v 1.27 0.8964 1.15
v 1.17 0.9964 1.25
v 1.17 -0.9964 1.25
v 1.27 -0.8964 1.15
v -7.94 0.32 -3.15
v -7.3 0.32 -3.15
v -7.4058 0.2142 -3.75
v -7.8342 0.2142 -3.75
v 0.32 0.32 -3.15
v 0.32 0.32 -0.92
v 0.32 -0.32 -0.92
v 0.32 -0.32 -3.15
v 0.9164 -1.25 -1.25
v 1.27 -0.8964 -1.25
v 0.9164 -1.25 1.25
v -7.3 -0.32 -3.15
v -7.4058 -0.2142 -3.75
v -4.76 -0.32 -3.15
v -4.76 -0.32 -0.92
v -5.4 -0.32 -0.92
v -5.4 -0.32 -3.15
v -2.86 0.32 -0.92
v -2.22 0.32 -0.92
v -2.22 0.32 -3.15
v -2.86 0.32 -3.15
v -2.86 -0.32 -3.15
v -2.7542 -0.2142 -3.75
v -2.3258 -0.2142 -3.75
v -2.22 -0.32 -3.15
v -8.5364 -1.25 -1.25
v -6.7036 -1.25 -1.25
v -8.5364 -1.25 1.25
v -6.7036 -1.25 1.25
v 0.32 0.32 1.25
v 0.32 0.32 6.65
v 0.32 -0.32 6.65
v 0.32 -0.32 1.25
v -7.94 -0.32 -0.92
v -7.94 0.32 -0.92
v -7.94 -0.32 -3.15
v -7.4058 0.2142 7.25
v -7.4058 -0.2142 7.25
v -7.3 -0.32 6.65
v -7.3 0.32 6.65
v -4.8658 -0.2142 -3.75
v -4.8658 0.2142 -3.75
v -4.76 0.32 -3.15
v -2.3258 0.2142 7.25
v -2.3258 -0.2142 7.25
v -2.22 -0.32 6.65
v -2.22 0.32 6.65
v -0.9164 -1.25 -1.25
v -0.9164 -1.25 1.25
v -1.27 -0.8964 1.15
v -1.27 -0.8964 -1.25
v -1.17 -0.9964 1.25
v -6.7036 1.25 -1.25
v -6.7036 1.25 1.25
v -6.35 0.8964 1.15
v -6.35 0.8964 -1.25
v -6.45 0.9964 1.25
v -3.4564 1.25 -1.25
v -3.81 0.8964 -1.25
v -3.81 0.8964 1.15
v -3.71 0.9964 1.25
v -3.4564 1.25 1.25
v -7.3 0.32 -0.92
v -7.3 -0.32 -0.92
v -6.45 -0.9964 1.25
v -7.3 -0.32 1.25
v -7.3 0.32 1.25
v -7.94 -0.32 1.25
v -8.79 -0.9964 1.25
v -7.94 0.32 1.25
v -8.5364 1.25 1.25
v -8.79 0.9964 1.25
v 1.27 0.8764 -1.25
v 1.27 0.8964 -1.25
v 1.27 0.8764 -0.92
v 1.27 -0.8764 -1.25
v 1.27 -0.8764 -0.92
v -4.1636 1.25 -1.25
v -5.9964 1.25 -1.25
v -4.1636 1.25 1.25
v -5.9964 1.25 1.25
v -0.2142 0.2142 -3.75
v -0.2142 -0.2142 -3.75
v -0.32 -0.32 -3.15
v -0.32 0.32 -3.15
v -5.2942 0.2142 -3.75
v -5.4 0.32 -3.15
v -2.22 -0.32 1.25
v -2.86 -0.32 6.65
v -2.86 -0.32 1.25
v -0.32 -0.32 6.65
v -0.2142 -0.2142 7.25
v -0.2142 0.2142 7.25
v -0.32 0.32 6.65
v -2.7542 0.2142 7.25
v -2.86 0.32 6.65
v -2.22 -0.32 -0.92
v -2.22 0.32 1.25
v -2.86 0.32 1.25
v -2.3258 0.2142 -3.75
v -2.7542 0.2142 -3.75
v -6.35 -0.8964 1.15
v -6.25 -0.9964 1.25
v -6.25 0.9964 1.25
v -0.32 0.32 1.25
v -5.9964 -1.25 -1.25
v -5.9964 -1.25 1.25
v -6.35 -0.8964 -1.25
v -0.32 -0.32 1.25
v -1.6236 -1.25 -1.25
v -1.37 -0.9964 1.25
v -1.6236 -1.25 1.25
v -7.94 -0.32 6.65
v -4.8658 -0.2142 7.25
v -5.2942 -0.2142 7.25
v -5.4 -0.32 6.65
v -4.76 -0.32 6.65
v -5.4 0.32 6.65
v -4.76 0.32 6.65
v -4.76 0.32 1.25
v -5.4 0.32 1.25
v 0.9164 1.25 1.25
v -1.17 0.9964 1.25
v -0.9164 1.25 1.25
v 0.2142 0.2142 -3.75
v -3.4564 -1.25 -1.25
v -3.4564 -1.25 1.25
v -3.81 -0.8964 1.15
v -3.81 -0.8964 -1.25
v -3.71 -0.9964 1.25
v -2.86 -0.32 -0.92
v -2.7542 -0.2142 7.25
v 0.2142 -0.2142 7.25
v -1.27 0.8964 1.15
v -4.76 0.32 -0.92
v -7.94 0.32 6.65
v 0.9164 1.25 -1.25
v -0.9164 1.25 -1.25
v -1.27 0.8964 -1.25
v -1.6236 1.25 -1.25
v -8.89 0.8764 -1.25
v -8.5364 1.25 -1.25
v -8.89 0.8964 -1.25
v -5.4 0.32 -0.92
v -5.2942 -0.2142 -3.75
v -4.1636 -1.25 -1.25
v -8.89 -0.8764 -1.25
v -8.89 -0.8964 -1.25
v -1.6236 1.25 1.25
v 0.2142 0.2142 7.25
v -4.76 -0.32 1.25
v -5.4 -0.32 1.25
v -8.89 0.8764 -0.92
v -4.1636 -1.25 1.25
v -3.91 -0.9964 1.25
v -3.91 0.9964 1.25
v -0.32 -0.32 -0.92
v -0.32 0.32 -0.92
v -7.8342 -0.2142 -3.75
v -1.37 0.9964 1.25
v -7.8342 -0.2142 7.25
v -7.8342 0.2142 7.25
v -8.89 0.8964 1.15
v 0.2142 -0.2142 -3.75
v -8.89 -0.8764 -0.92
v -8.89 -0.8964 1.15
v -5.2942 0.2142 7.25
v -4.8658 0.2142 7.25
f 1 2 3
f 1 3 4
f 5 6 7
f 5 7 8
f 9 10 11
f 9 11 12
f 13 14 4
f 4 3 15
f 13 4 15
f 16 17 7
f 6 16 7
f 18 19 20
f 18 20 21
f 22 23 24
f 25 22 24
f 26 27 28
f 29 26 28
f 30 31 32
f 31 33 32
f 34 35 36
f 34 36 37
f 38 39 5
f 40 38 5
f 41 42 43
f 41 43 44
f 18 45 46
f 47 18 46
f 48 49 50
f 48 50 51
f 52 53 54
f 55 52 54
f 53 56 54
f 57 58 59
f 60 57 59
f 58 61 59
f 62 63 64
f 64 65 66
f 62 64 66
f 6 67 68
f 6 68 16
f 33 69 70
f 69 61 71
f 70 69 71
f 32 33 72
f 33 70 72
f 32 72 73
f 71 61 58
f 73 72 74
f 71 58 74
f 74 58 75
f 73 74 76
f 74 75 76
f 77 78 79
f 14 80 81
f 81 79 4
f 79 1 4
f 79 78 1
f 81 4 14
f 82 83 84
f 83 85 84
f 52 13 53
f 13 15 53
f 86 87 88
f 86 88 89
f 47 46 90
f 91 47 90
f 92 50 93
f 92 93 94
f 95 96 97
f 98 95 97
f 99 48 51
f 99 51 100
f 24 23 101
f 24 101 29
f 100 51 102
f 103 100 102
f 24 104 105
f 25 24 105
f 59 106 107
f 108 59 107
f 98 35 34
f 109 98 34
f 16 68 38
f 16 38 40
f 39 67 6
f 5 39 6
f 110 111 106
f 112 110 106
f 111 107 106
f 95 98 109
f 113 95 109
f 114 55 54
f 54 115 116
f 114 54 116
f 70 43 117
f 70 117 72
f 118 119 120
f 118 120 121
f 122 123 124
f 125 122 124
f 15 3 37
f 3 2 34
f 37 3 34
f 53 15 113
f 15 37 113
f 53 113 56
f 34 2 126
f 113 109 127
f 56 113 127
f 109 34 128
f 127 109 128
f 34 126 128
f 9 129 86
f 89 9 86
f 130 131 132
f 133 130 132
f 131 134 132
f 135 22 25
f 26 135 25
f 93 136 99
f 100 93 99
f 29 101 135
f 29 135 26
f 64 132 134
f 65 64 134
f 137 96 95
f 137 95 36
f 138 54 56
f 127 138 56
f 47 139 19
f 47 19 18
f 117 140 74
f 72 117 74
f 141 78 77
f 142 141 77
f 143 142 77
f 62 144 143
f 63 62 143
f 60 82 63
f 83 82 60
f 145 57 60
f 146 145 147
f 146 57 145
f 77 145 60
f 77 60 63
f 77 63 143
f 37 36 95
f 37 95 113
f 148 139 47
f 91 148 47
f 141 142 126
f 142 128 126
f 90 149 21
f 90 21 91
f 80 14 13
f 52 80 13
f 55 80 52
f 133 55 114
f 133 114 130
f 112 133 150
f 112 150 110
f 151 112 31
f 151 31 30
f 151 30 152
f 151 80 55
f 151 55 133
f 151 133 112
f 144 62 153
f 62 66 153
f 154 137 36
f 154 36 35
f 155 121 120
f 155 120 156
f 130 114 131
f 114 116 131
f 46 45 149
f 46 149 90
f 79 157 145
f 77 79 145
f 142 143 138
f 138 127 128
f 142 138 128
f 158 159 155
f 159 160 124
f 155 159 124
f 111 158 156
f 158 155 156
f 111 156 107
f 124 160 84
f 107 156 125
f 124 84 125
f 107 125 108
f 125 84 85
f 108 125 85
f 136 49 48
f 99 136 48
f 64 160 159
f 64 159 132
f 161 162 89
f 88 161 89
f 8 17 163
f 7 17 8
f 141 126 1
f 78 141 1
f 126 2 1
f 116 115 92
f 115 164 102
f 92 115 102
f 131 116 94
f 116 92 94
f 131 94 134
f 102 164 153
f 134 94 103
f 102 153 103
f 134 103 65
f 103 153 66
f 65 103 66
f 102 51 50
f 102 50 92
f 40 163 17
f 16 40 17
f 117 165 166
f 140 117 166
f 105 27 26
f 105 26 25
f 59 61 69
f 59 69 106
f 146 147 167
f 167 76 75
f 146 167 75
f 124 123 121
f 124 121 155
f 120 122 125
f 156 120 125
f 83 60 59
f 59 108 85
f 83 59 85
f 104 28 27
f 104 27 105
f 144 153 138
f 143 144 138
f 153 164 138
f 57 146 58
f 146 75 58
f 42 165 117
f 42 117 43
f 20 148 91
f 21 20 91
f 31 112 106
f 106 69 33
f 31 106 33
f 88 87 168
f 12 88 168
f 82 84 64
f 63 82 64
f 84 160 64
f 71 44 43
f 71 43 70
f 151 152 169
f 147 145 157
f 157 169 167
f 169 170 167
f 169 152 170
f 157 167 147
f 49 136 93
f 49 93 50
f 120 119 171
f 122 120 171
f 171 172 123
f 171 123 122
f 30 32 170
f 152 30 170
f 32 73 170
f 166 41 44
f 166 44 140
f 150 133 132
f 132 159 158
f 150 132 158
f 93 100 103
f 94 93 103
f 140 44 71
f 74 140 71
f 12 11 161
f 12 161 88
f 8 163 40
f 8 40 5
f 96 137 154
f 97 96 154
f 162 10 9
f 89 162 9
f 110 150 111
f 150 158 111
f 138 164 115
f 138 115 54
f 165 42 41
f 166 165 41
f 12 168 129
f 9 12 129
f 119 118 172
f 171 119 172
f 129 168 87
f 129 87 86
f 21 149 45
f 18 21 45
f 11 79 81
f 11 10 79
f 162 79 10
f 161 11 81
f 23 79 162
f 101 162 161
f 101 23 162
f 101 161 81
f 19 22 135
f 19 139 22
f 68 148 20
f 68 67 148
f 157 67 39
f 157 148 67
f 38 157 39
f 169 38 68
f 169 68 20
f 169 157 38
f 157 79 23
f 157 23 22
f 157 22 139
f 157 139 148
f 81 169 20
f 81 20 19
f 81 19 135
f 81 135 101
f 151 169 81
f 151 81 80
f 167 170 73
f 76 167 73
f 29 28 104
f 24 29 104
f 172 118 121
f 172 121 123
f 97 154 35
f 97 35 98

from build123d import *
from OCP.BRepFilletAPI import BRepFilletAPI_MakeChamfer

# Parameters (mm, degrees)
EXTRUDE1_DEPTH          = 1.25
CUT_EXTRUDE3_DEPTH      = 3.176671771
LPATTERN4_COUNT         = 4
LPATTERN4_PITCH         = 2.54
CUT_EXTRUDE1_DEPTH      = 10.064055384
CUT_EXTRUDE1_DEPTH_BACK = 10.064055384
SKETCH2_W               = 1.752893218
SKETCH2_H               = 0.33
SKETCH3_W               = 11
SKETCH3_H               = 0.64
EXTRUDE_THIN1_DEPTH     = 0.32
LPATTERN5_COUNT         = 5
LPATTERN5_PITCH         = 2.54
CHAMFER2_SIZE           = 0.6
CHAMFER2_SIZE2          = 0.105796188


with BuildPart() as part:
    # Sketch1 → Extrude1 (new, symmetric)
    with BuildSketch(Plane.XY):
        Polygon((-1.27, 0.896446609), (-0.916446609, 1.25), (0.916446609, 1.25), (1.27, 0.896446609), (1.27, -0.896446609), (0.916446609, -1.25), (-0.916446609, -1.25), (-1.27, -0.896446609), align=None)
    extrude1 = extrude(amount=EXTRUDE1_DEPTH, both=True)

    # Sketch4 → Cut-Extrude3 (cut, symmetric)
    with BuildSketch(Plane(origin=(0, 0, 0), x_dir=(1, 0, 0), z_dir=(0, 1, 0))):
        Polygon((-1.27, -1.15), (-1.17, -1.25), (-1.27, -1.25), align=None)
        Polygon((1.17, -1.25), (1.27, -1.15), (1.27, -1.25), align=None)
    cut_extrude3 = extrude(amount=CUT_EXTRUDE3_DEPTH, both=True, mode=Mode.SUBTRACT)

    # LPattern4: Extrude1, Cut-Extrude3 ×4
    with Locations(*[(-i * LPATTERN4_PITCH, 0, 0) for i in range(1, LPATTERN4_COUNT)]):
        add(extrude1)
        add(cut_extrude3, mode=Mode.SUBTRACT)

    # Sketch2 → Cut-Extrude1 (cut, two sides: drawn at the far end of the back side and taken through both)
    with BuildSketch(Plane(origin=(0, 0, 0), x_dir=(0, -1, 0), z_dir=(1, 0, 0)).offset(-CUT_EXTRUDE1_DEPTH_BACK)):
        with Locations((0, 1.085)):
            Rectangle(SKETCH2_W, SKETCH2_H)
    extrude(amount=CUT_EXTRUDE1_DEPTH + CUT_EXTRUDE1_DEPTH_BACK, mode=Mode.SUBTRACT)

    # Sketch3 → Extrude-Thin1 (add, symmetric)
    with BuildSketch(Plane(origin=(0, 0, 0), x_dir=(0, 0, -1), z_dir=(1, 0, 0))):
        with Locations((-1.75, 0)):
            Rectangle(SKETCH3_W, SKETCH3_H)
    extrude_thin1 = extrude(amount=EXTRUDE_THIN1_DEPTH, both=True)

    # LPattern5: Extrude-Thin1 ×5, 1 skipped
    with Locations(*[(-i * LPATTERN5_PITCH, 0, 0) for i in range(1, LPATTERN5_COUNT) if i not in (4,)]):
        add(extrude_thin1)

    # Chamfer2: one chamfer whose edges measure the first distance from different faces: ONE call of the kernel's chamfer builder (chamfer() names one face for all edges)
    chamfer2_edges_1 = [part.edges().sort_by_distance(p)[0] for p in [
        (0, -0.32, 7.25),
    ]]
    chamfer2_side_1 = [part.faces().sort_by_distance(p)[0] for p in [
        (0, -0.32, 4.25),
    ]]
    chamfer2_edges_2 = [part.edges().sort_by_distance(p)[0] for p in [
        (0, 0.32, -3.75),
    ]]
    chamfer2_side_2 = [part.faces().sort_by_distance(p)[0] for p in [
        (0, 0.32, -2.335),
    ]]
    chamfer2_edges_3 = [part.edges().sort_by_distance(p)[0] for p in [
        (-0.32, 0, 7.25),
    ]]
    chamfer2_side_3 = [part.faces().sort_by_distance(p)[0] for p in [
        (-0.32, 0, 4.25),
    ]]
    chamfer2_edges_4 = [part.edges().sort_by_distance(p)[0] for p in [
        (-0.32, 0, -3.75),
    ]]
    chamfer2_side_4 = [part.faces().sort_by_distance(p)[0] for p in [
        (-0.32, 0, -2.335),
    ]]
    chamfer2_edges_5 = [part.edges().sort_by_distance(p)[0] for p in [
        (0, -0.32, -3.75),
    ]]
    chamfer2_side_5 = [part.faces().sort_by_distance(p)[0] for p in [
        (0, -0.32, -2.335),
    ]]
    chamfer2_edges_6 = [part.edges().sort_by_distance(p)[0] for p in [
        (0.32, 0, -3.75),
    ]]
    chamfer2_side_6 = [part.faces().sort_by_distance(p)[0] for p in [
        (0.32, 0, -2.335),
    ]]
    chamfer2_edges_7 = [part.edges().sort_by_distance(p)[0] for p in [
        (0, 0.32, 7.25),
    ]]
    chamfer2_side_7 = [part.faces().sort_by_distance(p)[0] for p in [
        (0, 0.32, 4.25),
    ]]
    chamfer2_edges_8 = [part.edges().sort_by_distance(p)[0] for p in [
        (0.32, 0, 7.25),
    ]]
    chamfer2_side_8 = [part.faces().sort_by_distance(p)[0] for p in [
        (0.32, 0, 4.25),
    ]]
    chamfer2_edges_9 = [part.edges().sort_by_distance(p)[0] for p in [
        (-2.54, -0.32, 7.25),
    ]]
    chamfer2_side_9 = [part.faces().sort_by_distance(p)[0] for p in [
        (-2.54, -0.32, 4.25),
    ]]
    chamfer2_edges_10 = [part.edges().sort_by_distance(p)[0] for p in [
        (-2.54, 0.32, -3.75),
    ]]
    chamfer2_side_10 = [part.faces().sort_by_distance(p)[0] for p in [
        (-2.54, 0.32, -2.335),
    ]]
    chamfer2_edges_11 = [part.edges().sort_by_distance(p)[0] for p in [
        (-2.86, 0, -3.75),
    ]]
    chamfer2_side_11 = [part.faces().sort_by_distance(p)[0] for p in [
        (-2.86, 0, -2.335),
    ]]
    chamfer2_edges_12 = [part.edges().sort_by_distance(p)[0] for p in [
        (-2.86, 0, 7.25),
    ]]
    chamfer2_side_12 = [part.faces().sort_by_distance(p)[0] for p in [
        (-2.86, 0, 4.25),
    ]]
    chamfer2_edges_13 = [part.edges().sort_by_distance(p)[0] for p in [
        (-2.54, -0.32, -3.75),
    ]]
    chamfer2_side_13 = [part.faces().sort_by_distance(p)[0] for p in [
        (-2.54, -0.32, -2.335),
    ]]
    chamfer2_edges_14 = [part.edges().sort_by_distance(p)[0] for p in [
        (-2.22, 0, -3.75),
    ]]
    chamfer2_side_14 = [part.faces().sort_by_distance(p)[0] for p in [
        (-2.22, 0, -2.335),
    ]]
    chamfer2_edges_15 = [part.edges().sort_by_distance(p)[0] for p in [
        (-2.54, 0.32, 7.25),
    ]]
    chamfer2_side_15 = [part.faces().sort_by_distance(p)[0] for p in [
        (-2.54, 0.32, 4.25),
    ]]
    chamfer2_edges_16 = [part.edges().sort_by_distance(p)[0] for p in [
        (-2.22, 0, 7.25),
    ]]
    chamfer2_side_16 = [part.faces().sort_by_distance(p)[0] for p in [
        (-2.22, 0, 4.25),
    ]]
    chamfer2_edges_17 = [part.edges().sort_by_distance(p)[0] for p in [
        (-5.08, -0.32, 7.25),
    ]]
    chamfer2_side_17 = [part.faces().sort_by_distance(p)[0] for p in [
        (-5.08, -0.32, 4.25),
    ]]
    chamfer2_edges_18 = [part.edges().sort_by_distance(p)[0] for p in [
        (-5.08, 0.32, -3.75),
    ]]
    chamfer2_side_18 = [part.faces().sort_by_distance(p)[0] for p in [
        (-5.08, 0.32, -2.335),
    ]]
    chamfer2_edges_19 = [part.edges().sort_by_distance(p)[0] for p in [
        (-5.4, 0, -3.75),
    ]]
    chamfer2_side_19 = [part.faces().sort_by_distance(p)[0] for p in [
        (-5.4, 0, -2.335),
    ]]
    chamfer2_edges_20 = [part.edges().sort_by_distance(p)[0] for p in [
        (-5.4, 0, 7.25),
    ]]
    chamfer2_side_20 = [part.faces().sort_by_distance(p)[0] for p in [
        (-5.4, 0, 4.25),
    ]]
    chamfer2_edges_21 = [part.edges().sort_by_distance(p)[0] for p in [
        (-5.08, -0.32, -3.75),
    ]]
    chamfer2_side_21 = [part.faces().sort_by_distance(p)[0] for p in [
        (-5.08, -0.32, -2.335),
    ]]
    chamfer2_edges_22 = [part.edges().sort_by_distance(p)[0] for p in [
        (-4.76, 0, -3.75),
    ]]
    chamfer2_side_22 = [part.faces().sort_by_distance(p)[0] for p in [
        (-4.76, 0, -2.335),
    ]]
    chamfer2_edges_23 = [part.edges().sort_by_distance(p)[0] for p in [
        (-5.08, 0.32, 7.25),
    ]]
    chamfer2_side_23 = [part.faces().sort_by_distance(p)[0] for p in [
        (-5.08, 0.32, 4.25),
    ]]
    chamfer2_edges_24 = [part.edges().sort_by_distance(p)[0] for p in [
        (-4.76, 0, 7.25),
    ]]
    chamfer2_side_24 = [part.faces().sort_by_distance(p)[0] for p in [
        (-4.76, 0, 4.25),
    ]]
    chamfer2_edges_25 = [part.edges().sort_by_distance(p)[0] for p in [
        (-7.62, -0.32, 7.25),
    ]]
    chamfer2_side_25 = [part.faces().sort_by_distance(p)[0] for p in [
        (-7.62, -0.32, 4.25),
    ]]
    chamfer2_edges_26 = [part.edges().sort_by_distance(p)[0] for p in [
        (-7.62, 0.32, -3.75),
    ]]
    chamfer2_side_26 = [part.faces().sort_by_distance(p)[0] for p in [
        (-7.62, 0.32, -2.335),
    ]]
    chamfer2_edges_27 = [part.edges().sort_by_distance(p)[0] for p in [
        (-7.94, 0, -3.75),
    ]]
    chamfer2_side_27 = [part.faces().sort_by_distance(p)[0] for p in [
        (-7.94, 0, -2.335),
    ]]
    chamfer2_edges_28 = [part.edges().sort_by_distance(p)[0] for p in [
        (-7.94, 0, 7.25),
    ]]
    chamfer2_side_28 = [part.faces().sort_by_distance(p)[0] for p in [
        (-7.94, 0, 4.25),
    ]]
    chamfer2_edges_29 = [part.edges().sort_by_distance(p)[0] for p in [
        (-7.62, -0.32, -3.75),
    ]]
    chamfer2_side_29 = [part.faces().sort_by_distance(p)[0] for p in [
        (-7.62, -0.32, -2.335),
    ]]
    chamfer2_edges_30 = [part.edges().sort_by_distance(p)[0] for p in [
        (-7.3, 0, -3.75),
    ]]
    chamfer2_side_30 = [part.faces().sort_by_distance(p)[0] for p in [
        (-7.3, 0, -2.335),
    ]]
    chamfer2_edges_31 = [part.edges().sort_by_distance(p)[0] for p in [
        (-7.62, 0.32, 7.25),
    ]]
    chamfer2_side_31 = [part.faces().sort_by_distance(p)[0] for p in [
        (-7.62, 0.32, 4.25),
    ]]
    chamfer2_edges_32 = [part.edges().sort_by_distance(p)[0] for p in [
        (-7.3, 0, 7.25),
    ]]
    chamfer2_side_32 = [part.faces().sort_by_distance(p)[0] for p in [
        (-7.3, 0, 4.25),
    ]]
    chamfer2 = BRepFilletAPI_MakeChamfer(part.part.solid().wrapped)
    for e in chamfer2_edges_1:
        chamfer2.Add(CHAMFER2_SIZE, CHAMFER2_SIZE2, e.wrapped, chamfer2_side_1[0].wrapped)  # the first distance lies on this face
    for e in chamfer2_edges_2:
        chamfer2.Add(CHAMFER2_SIZE, CHAMFER2_SIZE2, e.wrapped, chamfer2_side_2[0].wrapped)  # the first distance lies on this face
    for e in chamfer2_edges_3:
        chamfer2.Add(CHAMFER2_SIZE, CHAMFER2_SIZE2, e.wrapped, chamfer2_side_3[0].wrapped)  # the first distance lies on this face
    for e in chamfer2_edges_4:
        chamfer2.Add(CHAMFER2_SIZE, CHAMFER2_SIZE2, e.wrapped, chamfer2_side_4[0].wrapped)  # the first distance lies on this face
    for e in chamfer2_edges_5:
        chamfer2.Add(CHAMFER2_SIZE, CHAMFER2_SIZE2, e.wrapped, chamfer2_side_5[0].wrapped)  # the first distance lies on this face
    for e in chamfer2_edges_6:
        chamfer2.Add(CHAMFER2_SIZE, CHAMFER2_SIZE2, e.wrapped, chamfer2_side_6[0].wrapped)  # the first distance lies on this face
    for e in chamfer2_edges_7:
        chamfer2.Add(CHAMFER2_SIZE, CHAMFER2_SIZE2, e.wrapped, chamfer2_side_7[0].wrapped)  # the first distance lies on this face
    for e in chamfer2_edges_8:
        chamfer2.Add(CHAMFER2_SIZE, CHAMFER2_SIZE2, e.wrapped, chamfer2_side_8[0].wrapped)  # the first distance lies on this face
    for e in chamfer2_edges_9:
        chamfer2.Add(CHAMFER2_SIZE, CHAMFER2_SIZE2, e.wrapped, chamfer2_side_9[0].wrapped)  # the first distance lies on this face
    for e in chamfer2_edges_10:
        chamfer2.Add(CHAMFER2_SIZE, CHAMFER2_SIZE2, e.wrapped, chamfer2_side_10[0].wrapped)  # the first distance lies on this face
    for e in chamfer2_edges_11:
        chamfer2.Add(CHAMFER2_SIZE, CHAMFER2_SIZE2, e.wrapped, chamfer2_side_11[0].wrapped)  # the first distance lies on this face
    for e in chamfer2_edges_12:
        chamfer2.Add(CHAMFER2_SIZE, CHAMFER2_SIZE2, e.wrapped, chamfer2_side_12[0].wrapped)  # the first distance lies on this face
    for e in chamfer2_edges_13:
        chamfer2.Add(CHAMFER2_SIZE, CHAMFER2_SIZE2, e.wrapped, chamfer2_side_13[0].wrapped)  # the first distance lies on this face
    for e in chamfer2_edges_14:
        chamfer2.Add(CHAMFER2_SIZE, CHAMFER2_SIZE2, e.wrapped, chamfer2_side_14[0].wrapped)  # the first distance lies on this face
    for e in chamfer2_edges_15:
        chamfer2.Add(CHAMFER2_SIZE, CHAMFER2_SIZE2, e.wrapped, chamfer2_side_15[0].wrapped)  # the first distance lies on this face
    for e in chamfer2_edges_16:
        chamfer2.Add(CHAMFER2_SIZE, CHAMFER2_SIZE2, e.wrapped, chamfer2_side_16[0].wrapped)  # the first distance lies on this face
    for e in chamfer2_edges_17:
        chamfer2.Add(CHAMFER2_SIZE, CHAMFER2_SIZE2, e.wrapped, chamfer2_side_17[0].wrapped)  # the first distance lies on this face
    for e in chamfer2_edges_18:
        chamfer2.Add(CHAMFER2_SIZE, CHAMFER2_SIZE2, e.wrapped, chamfer2_side_18[0].wrapped)  # the first distance lies on this face
    for e in chamfer2_edges_19:
        chamfer2.Add(CHAMFER2_SIZE, CHAMFER2_SIZE2, e.wrapped, chamfer2_side_19[0].wrapped)  # the first distance lies on this face
    for e in chamfer2_edges_20:
        chamfer2.Add(CHAMFER2_SIZE, CHAMFER2_SIZE2, e.wrapped, chamfer2_side_20[0].wrapped)  # the first distance lies on this face
    for e in chamfer2_edges_21:
        chamfer2.Add(CHAMFER2_SIZE, CHAMFER2_SIZE2, e.wrapped, chamfer2_side_21[0].wrapped)  # the first distance lies on this face
    for e in chamfer2_edges_22:
        chamfer2.Add(CHAMFER2_SIZE, CHAMFER2_SIZE2, e.wrapped, chamfer2_side_22[0].wrapped)  # the first distance lies on this face
    for e in chamfer2_edges_23:
        chamfer2.Add(CHAMFER2_SIZE, CHAMFER2_SIZE2, e.wrapped, chamfer2_side_23[0].wrapped)  # the first distance lies on this face
    for e in chamfer2_edges_24:
        chamfer2.Add(CHAMFER2_SIZE, CHAMFER2_SIZE2, e.wrapped, chamfer2_side_24[0].wrapped)  # the first distance lies on this face
    for e in chamfer2_edges_25:
        chamfer2.Add(CHAMFER2_SIZE, CHAMFER2_SIZE2, e.wrapped, chamfer2_side_25[0].wrapped)  # the first distance lies on this face
    for e in chamfer2_edges_26:
        chamfer2.Add(CHAMFER2_SIZE, CHAMFER2_SIZE2, e.wrapped, chamfer2_side_26[0].wrapped)  # the first distance lies on this face
    for e in chamfer2_edges_27:
        chamfer2.Add(CHAMFER2_SIZE, CHAMFER2_SIZE2, e.wrapped, chamfer2_side_27[0].wrapped)  # the first distance lies on this face
    for e in chamfer2_edges_28:
        chamfer2.Add(CHAMFER2_SIZE, CHAMFER2_SIZE2, e.wrapped, chamfer2_side_28[0].wrapped)  # the first distance lies on this face
    for e in chamfer2_edges_29:
        chamfer2.Add(CHAMFER2_SIZE, CHAMFER2_SIZE2, e.wrapped, chamfer2_side_29[0].wrapped)  # the first distance lies on this face
    for e in chamfer2_edges_30:
        chamfer2.Add(CHAMFER2_SIZE, CHAMFER2_SIZE2, e.wrapped, chamfer2_side_30[0].wrapped)  # the first distance lies on this face
    for e in chamfer2_edges_31:
        chamfer2.Add(CHAMFER2_SIZE, CHAMFER2_SIZE2, e.wrapped, chamfer2_side_31[0].wrapped)  # the first distance lies on this face
    for e in chamfer2_edges_32:
        chamfer2.Add(CHAMFER2_SIZE, CHAMFER2_SIZE2, e.wrapped, chamfer2_side_32[0].wrapped)  # the first distance lies on this face
    add(Compound.cast(chamfer2.Shape()), mode=Mode.REPLACE)


solid = part.part
